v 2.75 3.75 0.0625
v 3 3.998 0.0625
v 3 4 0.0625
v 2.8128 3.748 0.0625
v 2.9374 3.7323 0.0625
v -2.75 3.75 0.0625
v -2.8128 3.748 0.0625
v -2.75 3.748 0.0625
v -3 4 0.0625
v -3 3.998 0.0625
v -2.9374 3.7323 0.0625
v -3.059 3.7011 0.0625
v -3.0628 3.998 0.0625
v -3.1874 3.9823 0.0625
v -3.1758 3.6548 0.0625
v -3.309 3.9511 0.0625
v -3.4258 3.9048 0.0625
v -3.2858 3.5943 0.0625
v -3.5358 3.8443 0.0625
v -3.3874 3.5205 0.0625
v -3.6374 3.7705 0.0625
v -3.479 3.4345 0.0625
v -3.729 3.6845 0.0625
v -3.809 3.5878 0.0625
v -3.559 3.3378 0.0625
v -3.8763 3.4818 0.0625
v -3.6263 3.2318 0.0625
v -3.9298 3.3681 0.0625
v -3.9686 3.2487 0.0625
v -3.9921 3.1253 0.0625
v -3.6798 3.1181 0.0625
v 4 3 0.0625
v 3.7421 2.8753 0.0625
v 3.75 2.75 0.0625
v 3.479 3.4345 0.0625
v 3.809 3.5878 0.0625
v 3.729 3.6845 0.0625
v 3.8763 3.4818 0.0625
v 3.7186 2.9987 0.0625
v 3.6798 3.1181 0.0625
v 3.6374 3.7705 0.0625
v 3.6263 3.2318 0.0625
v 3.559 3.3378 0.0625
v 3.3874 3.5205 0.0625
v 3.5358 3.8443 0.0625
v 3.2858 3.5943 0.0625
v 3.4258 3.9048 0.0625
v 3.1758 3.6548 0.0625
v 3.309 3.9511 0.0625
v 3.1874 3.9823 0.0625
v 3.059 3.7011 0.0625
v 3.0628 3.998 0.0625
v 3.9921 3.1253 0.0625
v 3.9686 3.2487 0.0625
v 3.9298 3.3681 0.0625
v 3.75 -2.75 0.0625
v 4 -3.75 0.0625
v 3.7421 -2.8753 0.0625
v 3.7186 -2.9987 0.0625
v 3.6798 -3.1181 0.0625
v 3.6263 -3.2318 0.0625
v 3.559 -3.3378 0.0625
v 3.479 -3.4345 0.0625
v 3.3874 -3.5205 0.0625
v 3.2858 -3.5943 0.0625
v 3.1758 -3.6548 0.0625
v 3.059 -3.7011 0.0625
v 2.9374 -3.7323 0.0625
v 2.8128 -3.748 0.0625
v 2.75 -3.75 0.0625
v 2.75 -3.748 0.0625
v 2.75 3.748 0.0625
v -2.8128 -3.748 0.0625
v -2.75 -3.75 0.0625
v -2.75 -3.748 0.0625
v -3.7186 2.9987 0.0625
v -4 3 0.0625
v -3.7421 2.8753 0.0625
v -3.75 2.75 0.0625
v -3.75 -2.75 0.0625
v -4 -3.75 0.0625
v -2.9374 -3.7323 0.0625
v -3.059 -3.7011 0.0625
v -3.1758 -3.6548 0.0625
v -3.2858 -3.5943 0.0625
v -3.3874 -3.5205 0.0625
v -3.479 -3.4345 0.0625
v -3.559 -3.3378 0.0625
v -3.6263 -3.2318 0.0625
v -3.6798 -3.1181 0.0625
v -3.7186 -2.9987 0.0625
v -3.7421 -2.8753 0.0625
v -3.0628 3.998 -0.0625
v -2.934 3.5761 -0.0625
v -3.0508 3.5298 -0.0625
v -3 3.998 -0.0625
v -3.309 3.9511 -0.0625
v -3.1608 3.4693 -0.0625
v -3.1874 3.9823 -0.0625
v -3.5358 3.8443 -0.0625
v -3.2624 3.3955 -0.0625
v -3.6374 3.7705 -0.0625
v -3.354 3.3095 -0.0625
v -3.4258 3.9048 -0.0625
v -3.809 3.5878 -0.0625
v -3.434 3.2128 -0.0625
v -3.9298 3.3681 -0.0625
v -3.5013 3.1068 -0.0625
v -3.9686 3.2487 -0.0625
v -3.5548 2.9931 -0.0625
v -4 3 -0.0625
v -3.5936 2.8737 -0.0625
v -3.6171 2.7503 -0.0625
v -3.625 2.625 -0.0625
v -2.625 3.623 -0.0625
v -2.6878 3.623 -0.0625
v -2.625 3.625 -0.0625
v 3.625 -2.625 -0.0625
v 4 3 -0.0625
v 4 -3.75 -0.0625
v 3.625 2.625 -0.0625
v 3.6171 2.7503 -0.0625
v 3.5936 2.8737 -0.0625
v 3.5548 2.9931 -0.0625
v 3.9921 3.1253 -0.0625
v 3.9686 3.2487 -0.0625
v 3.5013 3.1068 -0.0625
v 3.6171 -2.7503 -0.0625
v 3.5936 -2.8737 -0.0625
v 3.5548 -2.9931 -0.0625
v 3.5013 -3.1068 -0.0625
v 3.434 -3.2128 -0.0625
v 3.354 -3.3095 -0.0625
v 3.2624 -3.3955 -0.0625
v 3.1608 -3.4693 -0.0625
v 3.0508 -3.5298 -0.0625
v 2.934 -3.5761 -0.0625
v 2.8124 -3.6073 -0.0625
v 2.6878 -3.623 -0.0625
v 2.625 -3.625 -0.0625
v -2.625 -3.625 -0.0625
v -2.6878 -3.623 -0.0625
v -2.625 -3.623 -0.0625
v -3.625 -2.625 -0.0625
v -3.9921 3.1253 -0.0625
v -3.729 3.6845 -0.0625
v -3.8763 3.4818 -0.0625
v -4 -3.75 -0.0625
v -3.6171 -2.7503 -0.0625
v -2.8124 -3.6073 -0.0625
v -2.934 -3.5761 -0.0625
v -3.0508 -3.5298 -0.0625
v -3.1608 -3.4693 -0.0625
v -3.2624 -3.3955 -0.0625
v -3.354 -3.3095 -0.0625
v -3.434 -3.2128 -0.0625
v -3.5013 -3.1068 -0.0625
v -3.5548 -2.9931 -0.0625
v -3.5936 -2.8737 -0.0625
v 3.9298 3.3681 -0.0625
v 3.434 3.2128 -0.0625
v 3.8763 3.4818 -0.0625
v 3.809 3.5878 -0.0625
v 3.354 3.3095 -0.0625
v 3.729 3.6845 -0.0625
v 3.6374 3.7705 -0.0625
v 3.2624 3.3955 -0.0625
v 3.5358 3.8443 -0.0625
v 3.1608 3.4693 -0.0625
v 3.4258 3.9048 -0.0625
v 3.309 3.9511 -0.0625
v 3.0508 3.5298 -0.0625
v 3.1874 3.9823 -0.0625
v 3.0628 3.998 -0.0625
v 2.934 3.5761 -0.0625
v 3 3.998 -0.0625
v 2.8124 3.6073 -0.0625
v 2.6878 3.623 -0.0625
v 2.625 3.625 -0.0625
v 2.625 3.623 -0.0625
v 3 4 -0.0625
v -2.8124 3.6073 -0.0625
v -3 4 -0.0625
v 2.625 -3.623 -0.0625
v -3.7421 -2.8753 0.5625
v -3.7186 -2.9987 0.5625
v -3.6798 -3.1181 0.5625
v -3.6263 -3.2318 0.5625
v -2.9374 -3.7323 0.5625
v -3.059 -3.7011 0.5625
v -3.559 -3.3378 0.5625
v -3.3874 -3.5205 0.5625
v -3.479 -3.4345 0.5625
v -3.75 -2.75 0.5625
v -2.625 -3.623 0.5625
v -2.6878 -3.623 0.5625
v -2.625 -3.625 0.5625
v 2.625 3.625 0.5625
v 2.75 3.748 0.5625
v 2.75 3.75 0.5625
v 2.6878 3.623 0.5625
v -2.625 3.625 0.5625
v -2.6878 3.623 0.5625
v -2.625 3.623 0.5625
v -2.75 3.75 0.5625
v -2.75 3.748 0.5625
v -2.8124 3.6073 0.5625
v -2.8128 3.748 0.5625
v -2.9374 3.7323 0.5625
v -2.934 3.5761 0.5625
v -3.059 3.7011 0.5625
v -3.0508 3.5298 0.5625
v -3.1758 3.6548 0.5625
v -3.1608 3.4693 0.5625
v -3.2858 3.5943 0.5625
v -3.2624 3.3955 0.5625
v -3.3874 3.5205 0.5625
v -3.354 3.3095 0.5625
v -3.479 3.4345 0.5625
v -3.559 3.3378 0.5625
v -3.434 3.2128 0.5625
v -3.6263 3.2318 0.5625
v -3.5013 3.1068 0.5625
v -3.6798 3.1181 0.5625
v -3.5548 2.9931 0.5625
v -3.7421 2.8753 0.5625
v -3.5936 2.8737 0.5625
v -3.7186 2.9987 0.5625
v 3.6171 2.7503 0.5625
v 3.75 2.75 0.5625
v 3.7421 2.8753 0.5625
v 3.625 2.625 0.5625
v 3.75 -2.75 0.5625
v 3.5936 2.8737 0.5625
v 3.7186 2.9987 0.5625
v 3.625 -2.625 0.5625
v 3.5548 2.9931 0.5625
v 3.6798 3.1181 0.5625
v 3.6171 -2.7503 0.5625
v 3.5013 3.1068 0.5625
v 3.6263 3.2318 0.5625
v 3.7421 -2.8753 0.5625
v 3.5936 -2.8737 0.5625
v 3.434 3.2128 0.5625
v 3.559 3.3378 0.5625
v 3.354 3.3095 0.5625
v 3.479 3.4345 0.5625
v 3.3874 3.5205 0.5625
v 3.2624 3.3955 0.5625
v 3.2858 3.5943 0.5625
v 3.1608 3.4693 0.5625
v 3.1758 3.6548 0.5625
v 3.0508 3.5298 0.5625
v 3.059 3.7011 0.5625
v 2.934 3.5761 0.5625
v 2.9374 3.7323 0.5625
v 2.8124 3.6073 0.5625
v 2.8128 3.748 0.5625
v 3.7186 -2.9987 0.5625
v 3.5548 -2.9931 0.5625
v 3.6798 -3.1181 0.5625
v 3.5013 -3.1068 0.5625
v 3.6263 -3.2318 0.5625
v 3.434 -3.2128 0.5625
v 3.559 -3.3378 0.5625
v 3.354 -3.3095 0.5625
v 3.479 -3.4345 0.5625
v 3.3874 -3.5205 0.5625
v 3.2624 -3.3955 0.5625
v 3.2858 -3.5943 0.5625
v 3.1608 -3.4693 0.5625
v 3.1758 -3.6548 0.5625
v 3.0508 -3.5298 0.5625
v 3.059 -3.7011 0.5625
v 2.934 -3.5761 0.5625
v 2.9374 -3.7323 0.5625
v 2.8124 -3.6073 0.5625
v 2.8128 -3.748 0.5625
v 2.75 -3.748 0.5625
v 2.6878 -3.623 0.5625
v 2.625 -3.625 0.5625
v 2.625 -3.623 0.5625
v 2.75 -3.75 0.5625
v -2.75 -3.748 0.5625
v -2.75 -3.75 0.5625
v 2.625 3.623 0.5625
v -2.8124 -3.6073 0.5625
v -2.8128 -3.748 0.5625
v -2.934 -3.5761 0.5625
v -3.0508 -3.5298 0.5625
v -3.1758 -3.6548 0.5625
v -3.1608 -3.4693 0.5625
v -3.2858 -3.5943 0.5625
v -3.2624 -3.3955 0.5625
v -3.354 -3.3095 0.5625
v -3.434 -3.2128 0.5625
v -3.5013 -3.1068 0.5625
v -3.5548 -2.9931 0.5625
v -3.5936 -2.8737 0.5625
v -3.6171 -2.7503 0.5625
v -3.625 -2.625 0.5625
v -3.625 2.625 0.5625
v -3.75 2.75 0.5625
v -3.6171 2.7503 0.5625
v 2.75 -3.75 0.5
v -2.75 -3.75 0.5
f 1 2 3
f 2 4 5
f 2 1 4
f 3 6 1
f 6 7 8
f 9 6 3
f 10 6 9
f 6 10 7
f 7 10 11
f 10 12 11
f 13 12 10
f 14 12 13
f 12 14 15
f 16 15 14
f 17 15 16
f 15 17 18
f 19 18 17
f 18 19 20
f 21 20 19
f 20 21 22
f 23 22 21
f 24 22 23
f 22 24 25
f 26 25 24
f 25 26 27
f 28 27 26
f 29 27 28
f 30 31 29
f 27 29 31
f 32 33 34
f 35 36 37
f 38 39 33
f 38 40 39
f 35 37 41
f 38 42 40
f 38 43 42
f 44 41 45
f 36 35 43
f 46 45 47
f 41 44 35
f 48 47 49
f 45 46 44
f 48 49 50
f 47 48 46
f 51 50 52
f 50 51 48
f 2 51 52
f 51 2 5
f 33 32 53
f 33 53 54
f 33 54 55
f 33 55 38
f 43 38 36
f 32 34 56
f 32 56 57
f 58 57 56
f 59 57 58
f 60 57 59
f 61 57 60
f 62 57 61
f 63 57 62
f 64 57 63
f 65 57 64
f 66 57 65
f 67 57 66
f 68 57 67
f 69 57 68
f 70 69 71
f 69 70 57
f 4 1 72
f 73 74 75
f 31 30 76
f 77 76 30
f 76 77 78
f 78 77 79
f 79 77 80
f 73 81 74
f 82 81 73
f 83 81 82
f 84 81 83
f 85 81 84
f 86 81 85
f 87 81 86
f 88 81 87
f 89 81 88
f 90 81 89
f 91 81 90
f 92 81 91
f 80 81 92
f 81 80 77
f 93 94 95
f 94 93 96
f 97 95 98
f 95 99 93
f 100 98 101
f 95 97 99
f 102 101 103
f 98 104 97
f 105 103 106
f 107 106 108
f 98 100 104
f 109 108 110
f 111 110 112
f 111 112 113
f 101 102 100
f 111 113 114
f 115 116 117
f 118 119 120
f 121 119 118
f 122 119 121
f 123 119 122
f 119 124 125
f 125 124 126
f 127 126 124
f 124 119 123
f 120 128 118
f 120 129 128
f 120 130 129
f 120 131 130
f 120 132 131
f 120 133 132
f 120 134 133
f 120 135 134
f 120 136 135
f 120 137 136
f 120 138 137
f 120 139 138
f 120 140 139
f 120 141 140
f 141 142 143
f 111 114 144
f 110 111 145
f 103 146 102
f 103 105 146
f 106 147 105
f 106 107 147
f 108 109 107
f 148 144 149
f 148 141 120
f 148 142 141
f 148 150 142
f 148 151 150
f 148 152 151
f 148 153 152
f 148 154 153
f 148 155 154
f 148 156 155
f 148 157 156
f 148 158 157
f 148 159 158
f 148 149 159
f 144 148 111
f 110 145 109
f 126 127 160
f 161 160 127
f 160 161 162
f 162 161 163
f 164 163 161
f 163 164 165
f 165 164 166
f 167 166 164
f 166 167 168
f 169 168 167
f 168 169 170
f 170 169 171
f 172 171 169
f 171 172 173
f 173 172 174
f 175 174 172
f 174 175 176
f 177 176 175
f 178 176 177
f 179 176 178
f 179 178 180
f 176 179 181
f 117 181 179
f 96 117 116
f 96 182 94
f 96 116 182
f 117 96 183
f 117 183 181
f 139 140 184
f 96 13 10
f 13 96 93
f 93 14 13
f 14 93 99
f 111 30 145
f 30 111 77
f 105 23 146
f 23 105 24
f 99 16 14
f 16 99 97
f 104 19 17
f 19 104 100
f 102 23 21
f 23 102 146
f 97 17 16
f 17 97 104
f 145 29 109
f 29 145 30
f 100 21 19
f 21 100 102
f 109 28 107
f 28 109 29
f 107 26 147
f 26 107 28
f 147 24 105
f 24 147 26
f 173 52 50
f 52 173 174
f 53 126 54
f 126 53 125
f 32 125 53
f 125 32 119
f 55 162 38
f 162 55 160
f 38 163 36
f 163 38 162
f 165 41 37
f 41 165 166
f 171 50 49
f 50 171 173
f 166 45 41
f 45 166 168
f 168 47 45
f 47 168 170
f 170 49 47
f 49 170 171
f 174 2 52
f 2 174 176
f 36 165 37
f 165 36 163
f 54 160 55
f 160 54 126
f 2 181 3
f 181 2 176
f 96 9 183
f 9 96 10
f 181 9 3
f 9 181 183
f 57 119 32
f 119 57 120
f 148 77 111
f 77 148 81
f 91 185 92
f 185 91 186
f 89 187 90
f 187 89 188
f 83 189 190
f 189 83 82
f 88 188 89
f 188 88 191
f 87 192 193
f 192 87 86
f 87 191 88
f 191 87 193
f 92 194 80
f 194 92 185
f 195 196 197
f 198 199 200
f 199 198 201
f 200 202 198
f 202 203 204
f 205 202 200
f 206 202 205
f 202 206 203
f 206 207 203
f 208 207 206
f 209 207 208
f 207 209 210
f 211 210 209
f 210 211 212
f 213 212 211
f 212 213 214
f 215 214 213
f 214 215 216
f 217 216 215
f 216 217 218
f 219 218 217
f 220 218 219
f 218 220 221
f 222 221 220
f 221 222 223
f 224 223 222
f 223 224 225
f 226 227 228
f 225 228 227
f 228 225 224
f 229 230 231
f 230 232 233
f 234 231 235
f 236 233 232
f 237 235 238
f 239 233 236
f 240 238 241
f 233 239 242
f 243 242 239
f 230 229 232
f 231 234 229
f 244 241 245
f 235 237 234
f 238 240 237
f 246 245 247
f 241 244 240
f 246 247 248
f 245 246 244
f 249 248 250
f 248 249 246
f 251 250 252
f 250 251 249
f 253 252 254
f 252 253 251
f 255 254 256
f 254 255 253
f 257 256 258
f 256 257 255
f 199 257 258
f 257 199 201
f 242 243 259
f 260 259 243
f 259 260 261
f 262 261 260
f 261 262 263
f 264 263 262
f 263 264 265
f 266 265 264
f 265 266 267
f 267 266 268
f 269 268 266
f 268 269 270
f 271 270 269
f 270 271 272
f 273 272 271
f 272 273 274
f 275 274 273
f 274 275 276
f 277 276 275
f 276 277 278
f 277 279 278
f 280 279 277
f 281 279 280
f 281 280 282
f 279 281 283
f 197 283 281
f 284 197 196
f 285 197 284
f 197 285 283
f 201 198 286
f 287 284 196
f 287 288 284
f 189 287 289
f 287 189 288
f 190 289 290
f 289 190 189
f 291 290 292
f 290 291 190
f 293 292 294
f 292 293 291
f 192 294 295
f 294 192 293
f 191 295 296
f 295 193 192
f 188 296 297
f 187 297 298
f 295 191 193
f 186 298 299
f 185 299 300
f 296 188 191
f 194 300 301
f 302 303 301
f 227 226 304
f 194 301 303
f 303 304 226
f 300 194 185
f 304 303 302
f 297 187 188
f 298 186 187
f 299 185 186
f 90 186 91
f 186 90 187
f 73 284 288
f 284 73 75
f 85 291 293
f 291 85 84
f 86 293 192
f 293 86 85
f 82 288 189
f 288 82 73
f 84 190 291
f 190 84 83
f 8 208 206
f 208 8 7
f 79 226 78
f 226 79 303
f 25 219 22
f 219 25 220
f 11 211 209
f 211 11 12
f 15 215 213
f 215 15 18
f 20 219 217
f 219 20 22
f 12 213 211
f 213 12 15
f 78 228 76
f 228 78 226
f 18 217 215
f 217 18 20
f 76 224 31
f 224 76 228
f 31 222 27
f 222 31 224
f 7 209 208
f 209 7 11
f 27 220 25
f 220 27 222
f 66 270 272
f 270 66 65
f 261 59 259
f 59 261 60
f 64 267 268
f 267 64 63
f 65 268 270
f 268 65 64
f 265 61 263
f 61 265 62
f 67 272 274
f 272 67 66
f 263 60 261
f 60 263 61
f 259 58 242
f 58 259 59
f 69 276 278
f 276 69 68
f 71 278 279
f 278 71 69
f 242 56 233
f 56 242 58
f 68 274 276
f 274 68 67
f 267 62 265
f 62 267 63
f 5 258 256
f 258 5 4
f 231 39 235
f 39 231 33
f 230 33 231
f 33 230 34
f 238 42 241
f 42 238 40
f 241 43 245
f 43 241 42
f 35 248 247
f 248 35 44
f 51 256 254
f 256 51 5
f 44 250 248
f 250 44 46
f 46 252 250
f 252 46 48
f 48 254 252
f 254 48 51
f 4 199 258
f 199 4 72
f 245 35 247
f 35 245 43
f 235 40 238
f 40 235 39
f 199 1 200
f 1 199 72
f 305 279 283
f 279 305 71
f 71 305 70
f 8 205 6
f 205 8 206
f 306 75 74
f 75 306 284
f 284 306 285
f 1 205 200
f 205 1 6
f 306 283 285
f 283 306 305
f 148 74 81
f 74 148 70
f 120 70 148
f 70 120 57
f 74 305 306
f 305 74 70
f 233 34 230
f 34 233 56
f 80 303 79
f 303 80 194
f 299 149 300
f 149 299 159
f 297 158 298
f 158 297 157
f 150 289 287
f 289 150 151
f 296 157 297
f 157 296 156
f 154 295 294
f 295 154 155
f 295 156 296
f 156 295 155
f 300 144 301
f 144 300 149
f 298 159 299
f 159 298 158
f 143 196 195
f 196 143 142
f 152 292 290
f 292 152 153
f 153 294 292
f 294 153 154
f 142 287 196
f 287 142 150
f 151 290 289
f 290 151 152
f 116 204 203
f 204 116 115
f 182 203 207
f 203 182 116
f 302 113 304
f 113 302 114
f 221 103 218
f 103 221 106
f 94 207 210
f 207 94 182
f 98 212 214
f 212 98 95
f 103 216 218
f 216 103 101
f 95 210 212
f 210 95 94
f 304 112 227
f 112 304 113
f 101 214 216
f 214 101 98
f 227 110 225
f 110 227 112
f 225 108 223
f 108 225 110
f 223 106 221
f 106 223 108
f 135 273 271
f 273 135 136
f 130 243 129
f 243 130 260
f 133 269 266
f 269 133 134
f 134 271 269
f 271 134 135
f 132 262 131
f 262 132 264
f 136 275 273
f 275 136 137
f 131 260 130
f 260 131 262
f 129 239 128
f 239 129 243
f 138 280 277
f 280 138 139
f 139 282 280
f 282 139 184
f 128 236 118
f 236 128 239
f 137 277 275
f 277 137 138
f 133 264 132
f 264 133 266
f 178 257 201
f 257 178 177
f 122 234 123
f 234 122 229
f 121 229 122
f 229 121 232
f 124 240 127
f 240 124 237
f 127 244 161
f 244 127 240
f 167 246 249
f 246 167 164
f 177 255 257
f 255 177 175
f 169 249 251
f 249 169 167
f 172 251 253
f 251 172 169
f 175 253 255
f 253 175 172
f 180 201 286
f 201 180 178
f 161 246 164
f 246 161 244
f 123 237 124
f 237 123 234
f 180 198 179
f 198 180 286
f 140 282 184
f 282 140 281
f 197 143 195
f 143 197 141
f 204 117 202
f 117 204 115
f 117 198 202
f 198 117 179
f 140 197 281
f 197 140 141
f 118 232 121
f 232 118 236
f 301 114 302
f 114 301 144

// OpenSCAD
use <MCAD/boxes.scad>

$fn = 50;

cornerRadius = 1.0;

difference()
{
    union()
    {
        translate([0, -0.5, 0])
        roundedBox([8,9,0.125], cornerRadius, true );
        
        translate([0, 0, 0.25])
        roundedBox([7.5, 7.5, 0.625], cornerRadius, true );
    }
    
    roundedBox([7.25,7.25,2], cornerRadius, true );
    
    translate([0,-4.75,0])
    cube([10,2,1], true );
}
